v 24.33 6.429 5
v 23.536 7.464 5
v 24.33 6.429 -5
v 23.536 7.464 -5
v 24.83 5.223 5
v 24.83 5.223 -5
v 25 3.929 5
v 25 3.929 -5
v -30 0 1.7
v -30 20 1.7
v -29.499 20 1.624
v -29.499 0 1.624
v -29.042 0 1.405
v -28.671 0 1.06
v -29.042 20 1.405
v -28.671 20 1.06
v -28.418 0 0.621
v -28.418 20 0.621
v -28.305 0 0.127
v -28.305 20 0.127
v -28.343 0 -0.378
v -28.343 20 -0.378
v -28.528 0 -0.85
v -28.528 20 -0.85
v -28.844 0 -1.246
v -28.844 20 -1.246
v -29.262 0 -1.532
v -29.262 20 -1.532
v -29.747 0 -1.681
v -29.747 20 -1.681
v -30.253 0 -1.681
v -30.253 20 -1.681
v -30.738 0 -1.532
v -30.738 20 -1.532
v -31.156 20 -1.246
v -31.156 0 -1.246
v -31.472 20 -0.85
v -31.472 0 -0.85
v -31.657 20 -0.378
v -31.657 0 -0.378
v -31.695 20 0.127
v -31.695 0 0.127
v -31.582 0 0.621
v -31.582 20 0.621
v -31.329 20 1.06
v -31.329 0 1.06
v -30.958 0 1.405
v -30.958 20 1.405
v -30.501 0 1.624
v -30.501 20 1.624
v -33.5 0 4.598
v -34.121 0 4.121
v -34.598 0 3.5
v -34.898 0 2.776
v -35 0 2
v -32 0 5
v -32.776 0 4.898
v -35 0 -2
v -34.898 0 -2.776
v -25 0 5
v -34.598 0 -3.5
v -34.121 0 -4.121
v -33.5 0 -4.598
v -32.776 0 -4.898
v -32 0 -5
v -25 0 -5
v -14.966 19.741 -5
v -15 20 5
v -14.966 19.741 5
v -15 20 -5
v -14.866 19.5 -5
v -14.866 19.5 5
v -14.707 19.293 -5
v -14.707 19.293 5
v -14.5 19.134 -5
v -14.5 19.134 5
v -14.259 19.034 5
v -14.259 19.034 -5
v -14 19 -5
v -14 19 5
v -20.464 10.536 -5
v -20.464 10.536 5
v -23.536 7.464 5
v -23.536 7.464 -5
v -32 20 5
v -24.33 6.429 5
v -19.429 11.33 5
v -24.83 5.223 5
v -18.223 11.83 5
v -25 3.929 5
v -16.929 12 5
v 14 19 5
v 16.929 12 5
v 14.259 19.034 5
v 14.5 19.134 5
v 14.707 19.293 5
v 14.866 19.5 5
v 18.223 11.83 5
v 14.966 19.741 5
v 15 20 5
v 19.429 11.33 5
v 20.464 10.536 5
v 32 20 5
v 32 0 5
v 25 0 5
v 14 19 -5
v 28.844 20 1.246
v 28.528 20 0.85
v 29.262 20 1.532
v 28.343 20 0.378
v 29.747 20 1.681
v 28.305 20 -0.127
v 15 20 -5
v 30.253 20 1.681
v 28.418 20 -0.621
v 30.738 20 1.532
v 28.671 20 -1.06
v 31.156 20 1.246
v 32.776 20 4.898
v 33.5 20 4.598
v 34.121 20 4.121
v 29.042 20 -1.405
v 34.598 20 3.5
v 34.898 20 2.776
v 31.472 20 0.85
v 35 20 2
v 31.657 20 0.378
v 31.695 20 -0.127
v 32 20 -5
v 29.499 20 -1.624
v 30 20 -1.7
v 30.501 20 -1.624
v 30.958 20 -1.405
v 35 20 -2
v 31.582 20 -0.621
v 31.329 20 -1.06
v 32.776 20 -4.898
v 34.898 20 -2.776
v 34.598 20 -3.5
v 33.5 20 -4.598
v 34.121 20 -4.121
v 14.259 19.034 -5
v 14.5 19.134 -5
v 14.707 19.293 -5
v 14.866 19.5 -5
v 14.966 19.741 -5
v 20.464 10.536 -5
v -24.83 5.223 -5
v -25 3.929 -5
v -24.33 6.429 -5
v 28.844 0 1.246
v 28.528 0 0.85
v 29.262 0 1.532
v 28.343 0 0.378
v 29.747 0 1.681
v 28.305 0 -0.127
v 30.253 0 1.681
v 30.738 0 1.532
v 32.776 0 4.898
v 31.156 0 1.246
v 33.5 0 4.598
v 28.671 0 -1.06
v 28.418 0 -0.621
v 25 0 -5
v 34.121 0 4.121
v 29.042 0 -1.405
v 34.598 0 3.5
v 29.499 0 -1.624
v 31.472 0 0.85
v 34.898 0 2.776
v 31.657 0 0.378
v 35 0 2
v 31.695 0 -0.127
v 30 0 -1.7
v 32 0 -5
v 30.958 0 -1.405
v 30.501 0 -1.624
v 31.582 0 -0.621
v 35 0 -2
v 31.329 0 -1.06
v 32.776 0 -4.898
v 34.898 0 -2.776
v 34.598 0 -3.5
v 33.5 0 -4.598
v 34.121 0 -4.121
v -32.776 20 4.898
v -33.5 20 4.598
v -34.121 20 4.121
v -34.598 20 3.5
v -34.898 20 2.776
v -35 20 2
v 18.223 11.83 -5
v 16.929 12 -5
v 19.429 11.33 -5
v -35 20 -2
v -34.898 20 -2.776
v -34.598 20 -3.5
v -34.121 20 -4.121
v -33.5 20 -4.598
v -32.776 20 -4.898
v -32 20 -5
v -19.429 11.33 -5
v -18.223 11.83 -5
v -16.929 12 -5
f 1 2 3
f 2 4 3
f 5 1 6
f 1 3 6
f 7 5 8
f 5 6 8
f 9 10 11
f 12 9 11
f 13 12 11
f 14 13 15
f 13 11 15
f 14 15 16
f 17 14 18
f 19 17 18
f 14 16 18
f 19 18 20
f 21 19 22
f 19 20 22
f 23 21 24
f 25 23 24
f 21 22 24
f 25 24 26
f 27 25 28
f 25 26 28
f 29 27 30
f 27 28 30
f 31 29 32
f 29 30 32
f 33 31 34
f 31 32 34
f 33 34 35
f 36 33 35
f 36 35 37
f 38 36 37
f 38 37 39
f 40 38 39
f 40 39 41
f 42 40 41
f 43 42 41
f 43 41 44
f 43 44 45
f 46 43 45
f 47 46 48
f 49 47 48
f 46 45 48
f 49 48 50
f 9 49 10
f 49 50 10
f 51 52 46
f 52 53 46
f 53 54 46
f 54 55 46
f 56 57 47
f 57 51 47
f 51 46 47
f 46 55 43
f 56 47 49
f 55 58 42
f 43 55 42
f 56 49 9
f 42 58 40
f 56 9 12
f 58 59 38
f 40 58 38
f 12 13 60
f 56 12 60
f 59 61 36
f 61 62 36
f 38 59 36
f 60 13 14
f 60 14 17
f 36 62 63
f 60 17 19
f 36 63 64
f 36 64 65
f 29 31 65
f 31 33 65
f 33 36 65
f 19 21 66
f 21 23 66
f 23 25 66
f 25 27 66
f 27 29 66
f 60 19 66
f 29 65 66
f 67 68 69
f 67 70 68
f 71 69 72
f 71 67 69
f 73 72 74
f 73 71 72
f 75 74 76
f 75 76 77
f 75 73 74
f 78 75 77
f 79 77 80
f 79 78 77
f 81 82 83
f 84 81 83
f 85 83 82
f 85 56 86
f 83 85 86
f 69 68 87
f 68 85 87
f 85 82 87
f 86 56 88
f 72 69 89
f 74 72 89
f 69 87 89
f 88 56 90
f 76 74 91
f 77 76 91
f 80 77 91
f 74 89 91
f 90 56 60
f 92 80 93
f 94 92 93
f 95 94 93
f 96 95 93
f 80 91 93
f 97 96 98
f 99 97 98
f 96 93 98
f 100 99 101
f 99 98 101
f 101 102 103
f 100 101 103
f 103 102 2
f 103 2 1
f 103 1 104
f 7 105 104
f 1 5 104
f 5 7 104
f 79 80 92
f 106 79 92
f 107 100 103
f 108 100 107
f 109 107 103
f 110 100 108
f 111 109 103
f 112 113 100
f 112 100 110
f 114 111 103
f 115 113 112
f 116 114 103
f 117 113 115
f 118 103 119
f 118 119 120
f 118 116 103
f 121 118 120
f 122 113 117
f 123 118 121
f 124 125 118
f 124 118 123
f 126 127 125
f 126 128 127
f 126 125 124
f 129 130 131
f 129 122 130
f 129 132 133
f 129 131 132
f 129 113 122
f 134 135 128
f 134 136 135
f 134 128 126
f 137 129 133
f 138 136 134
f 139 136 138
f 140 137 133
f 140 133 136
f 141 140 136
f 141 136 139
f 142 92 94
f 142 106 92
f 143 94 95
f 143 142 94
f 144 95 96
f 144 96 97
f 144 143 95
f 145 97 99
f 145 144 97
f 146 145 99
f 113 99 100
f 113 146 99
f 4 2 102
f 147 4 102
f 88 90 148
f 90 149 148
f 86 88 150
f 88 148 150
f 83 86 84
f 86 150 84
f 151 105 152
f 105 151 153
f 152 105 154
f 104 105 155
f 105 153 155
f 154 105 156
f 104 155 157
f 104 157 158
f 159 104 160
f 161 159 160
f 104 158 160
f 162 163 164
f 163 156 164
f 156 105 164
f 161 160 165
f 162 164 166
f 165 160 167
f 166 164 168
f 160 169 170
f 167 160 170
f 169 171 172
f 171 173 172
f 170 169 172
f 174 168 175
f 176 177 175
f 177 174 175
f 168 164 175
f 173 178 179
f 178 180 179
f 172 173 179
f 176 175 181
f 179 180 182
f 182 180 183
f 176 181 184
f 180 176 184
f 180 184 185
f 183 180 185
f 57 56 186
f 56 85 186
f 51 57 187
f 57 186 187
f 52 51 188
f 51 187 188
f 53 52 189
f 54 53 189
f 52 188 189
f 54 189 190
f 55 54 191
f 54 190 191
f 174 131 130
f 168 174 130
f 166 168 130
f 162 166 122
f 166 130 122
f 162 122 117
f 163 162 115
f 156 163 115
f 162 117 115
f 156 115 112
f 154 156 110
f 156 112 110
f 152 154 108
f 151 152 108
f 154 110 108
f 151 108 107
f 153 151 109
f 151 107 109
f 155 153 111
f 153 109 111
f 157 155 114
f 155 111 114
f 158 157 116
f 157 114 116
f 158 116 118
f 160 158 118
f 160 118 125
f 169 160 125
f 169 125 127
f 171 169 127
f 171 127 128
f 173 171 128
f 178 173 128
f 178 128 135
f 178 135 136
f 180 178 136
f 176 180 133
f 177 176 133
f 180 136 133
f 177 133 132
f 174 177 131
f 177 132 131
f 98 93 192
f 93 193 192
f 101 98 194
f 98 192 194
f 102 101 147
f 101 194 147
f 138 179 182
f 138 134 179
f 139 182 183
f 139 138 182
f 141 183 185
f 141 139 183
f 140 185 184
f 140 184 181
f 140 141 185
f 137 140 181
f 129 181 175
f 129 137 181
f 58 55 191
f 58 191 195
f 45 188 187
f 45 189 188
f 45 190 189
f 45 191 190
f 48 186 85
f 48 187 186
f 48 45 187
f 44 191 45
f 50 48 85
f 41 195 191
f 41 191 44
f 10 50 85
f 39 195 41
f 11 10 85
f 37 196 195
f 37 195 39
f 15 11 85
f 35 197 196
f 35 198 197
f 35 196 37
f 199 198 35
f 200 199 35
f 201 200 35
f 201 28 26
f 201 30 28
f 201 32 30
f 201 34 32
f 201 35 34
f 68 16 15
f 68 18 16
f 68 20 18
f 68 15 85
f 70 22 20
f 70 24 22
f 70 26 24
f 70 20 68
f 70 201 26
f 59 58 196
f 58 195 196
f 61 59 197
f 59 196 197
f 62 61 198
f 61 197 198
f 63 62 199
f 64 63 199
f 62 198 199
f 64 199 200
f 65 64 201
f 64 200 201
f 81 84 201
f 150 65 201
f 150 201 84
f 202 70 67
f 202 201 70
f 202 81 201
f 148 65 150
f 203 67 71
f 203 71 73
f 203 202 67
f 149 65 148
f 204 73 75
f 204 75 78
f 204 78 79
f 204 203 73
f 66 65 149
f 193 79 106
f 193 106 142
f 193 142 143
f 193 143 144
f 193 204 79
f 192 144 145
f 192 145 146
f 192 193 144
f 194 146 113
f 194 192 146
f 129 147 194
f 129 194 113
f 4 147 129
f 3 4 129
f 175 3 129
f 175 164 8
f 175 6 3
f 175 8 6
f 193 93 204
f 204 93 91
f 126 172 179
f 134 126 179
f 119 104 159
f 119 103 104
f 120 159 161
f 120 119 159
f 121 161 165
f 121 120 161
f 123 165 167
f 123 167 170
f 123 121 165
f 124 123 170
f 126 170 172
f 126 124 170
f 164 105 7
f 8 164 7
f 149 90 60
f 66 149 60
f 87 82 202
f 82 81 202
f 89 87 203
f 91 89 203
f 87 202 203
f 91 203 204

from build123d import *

# Parameters (mm, degrees)
SKETCH_1_W          = 70
SKETCH_1_H          = 10
EXTRUDE_1_DEPTH     = 20
SKETCH_2_R          = 1.7
CUT_EXTRUDE_1_DEPTH = 20
SKETCH_3_W          = 30
SKETCH_3_H          = 1
CUT_EXTRUDE_2_DEPTH = 10
FILLET_1_R          = 5
FILLET_2_R          = 3
FILLET_3_R          = 1


with BuildPart() as part:
    # 草图1 → 凸台-拉伸1 (new body)
    with BuildSketch(Plane(origin=(0, 0, 0), x_dir=(1, 0, 0), z_dir=(0, 1, 0))):
        Rectangle(SKETCH_1_W, SKETCH_1_H)
    extrude(amount=EXTRUDE_1_DEPTH)

    # 草图2 → 切除-拉伸1 (cut)
    with BuildSketch(Plane(origin=(0, 20, 0), x_dir=(1, 0, 0), z_dir=(0, 1, 0))):
        with Locations(Location((-30, 0, 0), (0, 0, 270))):
            Circle(SKETCH_2_R)
        with Locations(Location((30, 0, 0), (0, 0, 90))):
            Circle(SKETCH_2_R)
    extrude(amount=-CUT_EXTRUDE_1_DEPTH, mode=Mode.SUBTRACT)

    # 草图3 → 切除-拉伸2 (cut)
    with BuildSketch(Plane.XY.offset(5)):
        Polygon((-25, 0), (25, 0), (25, 6), (19, 12), (-19, 12), (-25, 6), align=None)
        with Locations((0, 19.5)):
            Rectangle(SKETCH_3_W, SKETCH_3_H)
    extrude(amount=-CUT_EXTRUDE_2_DEPTH, mode=Mode.SUBTRACT)

    # 圆角1
    fillet_1_edges = [part.edges().sort_by_distance(p)[0] for p in [
        (-25, 6, 0),
        (-19, 12, 0),
        (19, 12, 0),
        (25, 6, 0),
    ]]
    fillet(fillet_1_edges, radius=FILLET_1_R)

    # 圆角2
    fillet_2_edges = [part.edges().sort_by_distance(p)[0] for p in [
        (35, 10, 5),
        (-35, 10, 5),
        (-35, 10, -5),
        (35, 10, -5),
    ]]
    fillet(fillet_2_edges, radius=FILLET_2_R)

    # 圆角3
    fillet_3_edges = [part.edges().sort_by_distance(p)[0] for p in [
        (15, 19, 0),
        (-15, 19, 0),
    ]]
    fillet(fillet_3_edges, radius=FILLET_3_R - 0.0001)  # a hair under: the kernel refuses the full size


solid = part.part
